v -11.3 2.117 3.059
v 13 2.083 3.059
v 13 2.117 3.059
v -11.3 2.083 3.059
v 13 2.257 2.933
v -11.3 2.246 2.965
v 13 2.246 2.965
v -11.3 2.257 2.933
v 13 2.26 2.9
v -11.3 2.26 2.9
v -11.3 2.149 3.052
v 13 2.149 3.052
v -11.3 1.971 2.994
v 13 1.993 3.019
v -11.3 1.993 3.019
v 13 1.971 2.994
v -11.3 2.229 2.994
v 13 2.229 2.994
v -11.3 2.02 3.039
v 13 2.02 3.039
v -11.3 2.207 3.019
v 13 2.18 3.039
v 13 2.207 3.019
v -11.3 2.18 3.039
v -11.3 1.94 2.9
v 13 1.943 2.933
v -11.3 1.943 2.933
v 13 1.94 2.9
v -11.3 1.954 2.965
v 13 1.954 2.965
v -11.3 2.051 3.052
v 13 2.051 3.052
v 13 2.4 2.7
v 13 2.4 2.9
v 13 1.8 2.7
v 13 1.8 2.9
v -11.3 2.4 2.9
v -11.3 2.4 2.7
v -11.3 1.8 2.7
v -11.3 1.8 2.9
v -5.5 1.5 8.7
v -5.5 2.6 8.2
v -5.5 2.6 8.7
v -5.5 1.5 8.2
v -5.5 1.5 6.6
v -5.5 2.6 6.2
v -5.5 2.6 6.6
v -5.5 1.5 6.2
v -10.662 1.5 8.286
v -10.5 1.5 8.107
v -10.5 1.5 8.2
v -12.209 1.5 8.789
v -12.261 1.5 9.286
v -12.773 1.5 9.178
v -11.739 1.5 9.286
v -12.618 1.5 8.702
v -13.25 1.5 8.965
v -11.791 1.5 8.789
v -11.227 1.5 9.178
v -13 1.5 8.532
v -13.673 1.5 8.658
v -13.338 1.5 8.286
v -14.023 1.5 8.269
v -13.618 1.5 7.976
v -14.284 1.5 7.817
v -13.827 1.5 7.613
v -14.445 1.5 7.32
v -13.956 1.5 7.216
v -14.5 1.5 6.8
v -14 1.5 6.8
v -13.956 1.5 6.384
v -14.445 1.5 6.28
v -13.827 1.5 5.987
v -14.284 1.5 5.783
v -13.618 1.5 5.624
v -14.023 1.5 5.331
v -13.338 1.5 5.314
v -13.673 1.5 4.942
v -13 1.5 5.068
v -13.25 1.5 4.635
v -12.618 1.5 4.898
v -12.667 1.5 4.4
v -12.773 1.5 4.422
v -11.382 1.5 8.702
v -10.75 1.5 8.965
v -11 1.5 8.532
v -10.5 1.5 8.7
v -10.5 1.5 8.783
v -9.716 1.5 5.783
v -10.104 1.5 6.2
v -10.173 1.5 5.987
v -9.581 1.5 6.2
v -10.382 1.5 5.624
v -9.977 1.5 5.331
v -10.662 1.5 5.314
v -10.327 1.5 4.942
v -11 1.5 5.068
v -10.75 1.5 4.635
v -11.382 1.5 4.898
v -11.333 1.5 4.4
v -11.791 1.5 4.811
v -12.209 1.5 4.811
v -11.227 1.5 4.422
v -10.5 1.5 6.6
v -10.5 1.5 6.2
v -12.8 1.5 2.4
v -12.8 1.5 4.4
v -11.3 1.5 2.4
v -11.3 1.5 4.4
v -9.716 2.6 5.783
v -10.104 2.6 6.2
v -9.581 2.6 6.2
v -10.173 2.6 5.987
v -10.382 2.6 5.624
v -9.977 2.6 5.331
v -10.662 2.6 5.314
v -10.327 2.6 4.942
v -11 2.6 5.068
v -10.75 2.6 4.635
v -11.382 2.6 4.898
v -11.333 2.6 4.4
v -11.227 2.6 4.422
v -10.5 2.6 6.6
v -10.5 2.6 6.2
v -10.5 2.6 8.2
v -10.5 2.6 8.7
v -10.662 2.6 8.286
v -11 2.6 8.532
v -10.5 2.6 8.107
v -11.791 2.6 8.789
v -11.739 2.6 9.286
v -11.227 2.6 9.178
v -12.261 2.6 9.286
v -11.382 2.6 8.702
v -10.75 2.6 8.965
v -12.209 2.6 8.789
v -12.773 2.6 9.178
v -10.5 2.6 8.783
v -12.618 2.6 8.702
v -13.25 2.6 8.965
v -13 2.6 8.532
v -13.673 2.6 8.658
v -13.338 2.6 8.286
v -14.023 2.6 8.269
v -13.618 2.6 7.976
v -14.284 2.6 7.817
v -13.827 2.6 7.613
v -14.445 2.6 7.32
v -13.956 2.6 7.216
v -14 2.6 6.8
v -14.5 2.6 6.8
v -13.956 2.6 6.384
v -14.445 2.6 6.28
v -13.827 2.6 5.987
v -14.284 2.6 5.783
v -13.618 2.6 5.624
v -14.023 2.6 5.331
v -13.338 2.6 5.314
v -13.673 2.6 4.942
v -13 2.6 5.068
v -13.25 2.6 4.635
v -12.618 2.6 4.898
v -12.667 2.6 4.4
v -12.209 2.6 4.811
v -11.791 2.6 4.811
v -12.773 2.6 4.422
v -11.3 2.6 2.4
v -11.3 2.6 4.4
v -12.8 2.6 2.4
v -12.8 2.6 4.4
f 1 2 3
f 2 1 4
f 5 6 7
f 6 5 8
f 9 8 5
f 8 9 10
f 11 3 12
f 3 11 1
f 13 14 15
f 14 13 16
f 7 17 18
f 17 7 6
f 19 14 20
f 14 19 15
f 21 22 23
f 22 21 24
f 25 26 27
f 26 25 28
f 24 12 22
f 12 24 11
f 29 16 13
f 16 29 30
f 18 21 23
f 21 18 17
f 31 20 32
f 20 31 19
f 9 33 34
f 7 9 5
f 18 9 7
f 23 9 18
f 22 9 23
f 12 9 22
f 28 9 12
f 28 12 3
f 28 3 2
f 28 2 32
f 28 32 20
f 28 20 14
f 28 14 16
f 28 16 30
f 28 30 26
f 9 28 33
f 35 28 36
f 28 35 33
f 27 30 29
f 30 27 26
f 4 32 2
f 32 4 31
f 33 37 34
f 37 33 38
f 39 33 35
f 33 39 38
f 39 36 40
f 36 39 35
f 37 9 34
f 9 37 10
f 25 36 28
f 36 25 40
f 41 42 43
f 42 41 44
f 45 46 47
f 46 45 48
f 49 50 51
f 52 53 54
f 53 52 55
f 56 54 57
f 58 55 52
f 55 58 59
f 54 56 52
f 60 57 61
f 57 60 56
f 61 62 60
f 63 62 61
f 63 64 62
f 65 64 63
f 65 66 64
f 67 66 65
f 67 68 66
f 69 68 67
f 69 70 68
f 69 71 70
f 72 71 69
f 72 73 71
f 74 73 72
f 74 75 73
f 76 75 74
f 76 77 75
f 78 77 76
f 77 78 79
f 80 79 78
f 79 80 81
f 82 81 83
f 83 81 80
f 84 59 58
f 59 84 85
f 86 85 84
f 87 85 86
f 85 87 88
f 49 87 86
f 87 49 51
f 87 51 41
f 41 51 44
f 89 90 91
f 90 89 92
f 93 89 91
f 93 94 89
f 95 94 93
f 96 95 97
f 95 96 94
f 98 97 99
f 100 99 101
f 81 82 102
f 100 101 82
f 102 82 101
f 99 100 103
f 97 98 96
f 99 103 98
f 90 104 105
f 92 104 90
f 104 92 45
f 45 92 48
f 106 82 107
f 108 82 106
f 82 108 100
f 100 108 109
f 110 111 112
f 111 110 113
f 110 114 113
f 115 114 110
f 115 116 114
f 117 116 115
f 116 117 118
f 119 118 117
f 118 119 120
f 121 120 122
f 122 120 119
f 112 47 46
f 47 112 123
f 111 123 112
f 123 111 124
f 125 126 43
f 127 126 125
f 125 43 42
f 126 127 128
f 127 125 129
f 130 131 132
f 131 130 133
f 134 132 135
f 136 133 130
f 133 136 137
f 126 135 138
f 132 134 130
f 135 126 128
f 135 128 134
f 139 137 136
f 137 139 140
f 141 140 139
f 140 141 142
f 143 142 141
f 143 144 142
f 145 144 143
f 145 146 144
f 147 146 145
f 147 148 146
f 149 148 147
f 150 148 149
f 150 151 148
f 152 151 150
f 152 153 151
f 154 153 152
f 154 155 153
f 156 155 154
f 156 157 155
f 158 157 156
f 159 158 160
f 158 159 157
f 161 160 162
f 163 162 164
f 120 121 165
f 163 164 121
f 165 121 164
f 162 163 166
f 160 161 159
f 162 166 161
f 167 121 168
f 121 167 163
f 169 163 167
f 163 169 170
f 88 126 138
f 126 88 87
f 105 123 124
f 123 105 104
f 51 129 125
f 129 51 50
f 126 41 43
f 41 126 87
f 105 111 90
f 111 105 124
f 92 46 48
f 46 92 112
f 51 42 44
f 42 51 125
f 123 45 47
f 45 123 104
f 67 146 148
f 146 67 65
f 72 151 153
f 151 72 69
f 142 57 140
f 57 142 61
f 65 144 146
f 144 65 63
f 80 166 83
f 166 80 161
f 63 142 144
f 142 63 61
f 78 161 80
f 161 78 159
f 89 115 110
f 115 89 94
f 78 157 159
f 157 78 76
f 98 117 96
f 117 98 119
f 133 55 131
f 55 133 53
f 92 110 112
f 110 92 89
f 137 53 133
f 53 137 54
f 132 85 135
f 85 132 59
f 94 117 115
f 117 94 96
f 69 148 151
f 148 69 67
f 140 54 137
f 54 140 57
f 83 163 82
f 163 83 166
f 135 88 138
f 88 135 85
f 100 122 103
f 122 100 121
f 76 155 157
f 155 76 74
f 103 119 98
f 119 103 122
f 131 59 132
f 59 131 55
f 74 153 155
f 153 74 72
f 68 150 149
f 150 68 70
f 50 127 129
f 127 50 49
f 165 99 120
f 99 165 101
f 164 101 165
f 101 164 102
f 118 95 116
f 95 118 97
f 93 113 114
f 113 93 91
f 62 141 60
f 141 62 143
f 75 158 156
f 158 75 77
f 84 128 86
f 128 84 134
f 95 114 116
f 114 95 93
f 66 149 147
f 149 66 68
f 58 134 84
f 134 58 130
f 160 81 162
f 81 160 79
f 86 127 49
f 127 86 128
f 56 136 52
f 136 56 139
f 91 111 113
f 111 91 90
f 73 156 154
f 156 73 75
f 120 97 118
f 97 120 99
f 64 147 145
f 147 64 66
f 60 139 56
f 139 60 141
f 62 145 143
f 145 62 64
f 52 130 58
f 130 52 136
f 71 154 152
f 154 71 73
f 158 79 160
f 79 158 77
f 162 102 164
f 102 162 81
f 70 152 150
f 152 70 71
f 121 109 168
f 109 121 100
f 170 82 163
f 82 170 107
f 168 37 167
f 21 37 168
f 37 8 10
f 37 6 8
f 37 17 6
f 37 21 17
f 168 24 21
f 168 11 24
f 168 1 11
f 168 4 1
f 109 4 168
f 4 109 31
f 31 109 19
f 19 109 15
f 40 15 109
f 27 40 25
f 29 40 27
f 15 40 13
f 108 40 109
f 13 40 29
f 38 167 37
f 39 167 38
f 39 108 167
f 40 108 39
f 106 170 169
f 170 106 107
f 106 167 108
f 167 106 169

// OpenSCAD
// bâton avec bec de canard
// Duck bill stick
// Une long prisme rectangulaire avec un long demi cylindre (placer verticalement)
// Long rectangular prisim with half cylinder (vertical)
$fn=30; 
translate([-12,1.30,1.4])	{
rotate(a=120,v=[1,1,1])translate([0.8,1.5,0])cylinder(r=0.16,h=25);	
rotate(a=270,v=[5,0,0])translate([0,-1.5,0.5])cube(size=[25,0.2,0.6]);
								}
union() 					{
// bec du canard 
// Duck bill
translate([0,0.1,1.8])rotate(a=90,v=[1,0,0])	{
difference()		{	
translate([-10.5,4.4,-2.5])cube(size=[5,2.5,1.1]);
translate([-10.5,4.8,-2.5])cube(size=[5,1.6,1.5]);
						}
// tête du canard connecter au bec
//Duck head connected to bill			
difference()		{
translate([-12,5,-2.5])cylinder(r=2.5,h=1.1);
translate([-12,5,-2.5])cylinder(r=2,h=1.1);
translate([-10.5,4.8,-2.6])cube(size=[3,10,1.5]);
						}
//cou du canard
//Duck neck
translate ([-10,11,-4])rotate(a=120,v=[1,1,1])
translate([-10.4,1.5,-2.8])cube(size=[2,1.1,1.5]);
															}
			}	
